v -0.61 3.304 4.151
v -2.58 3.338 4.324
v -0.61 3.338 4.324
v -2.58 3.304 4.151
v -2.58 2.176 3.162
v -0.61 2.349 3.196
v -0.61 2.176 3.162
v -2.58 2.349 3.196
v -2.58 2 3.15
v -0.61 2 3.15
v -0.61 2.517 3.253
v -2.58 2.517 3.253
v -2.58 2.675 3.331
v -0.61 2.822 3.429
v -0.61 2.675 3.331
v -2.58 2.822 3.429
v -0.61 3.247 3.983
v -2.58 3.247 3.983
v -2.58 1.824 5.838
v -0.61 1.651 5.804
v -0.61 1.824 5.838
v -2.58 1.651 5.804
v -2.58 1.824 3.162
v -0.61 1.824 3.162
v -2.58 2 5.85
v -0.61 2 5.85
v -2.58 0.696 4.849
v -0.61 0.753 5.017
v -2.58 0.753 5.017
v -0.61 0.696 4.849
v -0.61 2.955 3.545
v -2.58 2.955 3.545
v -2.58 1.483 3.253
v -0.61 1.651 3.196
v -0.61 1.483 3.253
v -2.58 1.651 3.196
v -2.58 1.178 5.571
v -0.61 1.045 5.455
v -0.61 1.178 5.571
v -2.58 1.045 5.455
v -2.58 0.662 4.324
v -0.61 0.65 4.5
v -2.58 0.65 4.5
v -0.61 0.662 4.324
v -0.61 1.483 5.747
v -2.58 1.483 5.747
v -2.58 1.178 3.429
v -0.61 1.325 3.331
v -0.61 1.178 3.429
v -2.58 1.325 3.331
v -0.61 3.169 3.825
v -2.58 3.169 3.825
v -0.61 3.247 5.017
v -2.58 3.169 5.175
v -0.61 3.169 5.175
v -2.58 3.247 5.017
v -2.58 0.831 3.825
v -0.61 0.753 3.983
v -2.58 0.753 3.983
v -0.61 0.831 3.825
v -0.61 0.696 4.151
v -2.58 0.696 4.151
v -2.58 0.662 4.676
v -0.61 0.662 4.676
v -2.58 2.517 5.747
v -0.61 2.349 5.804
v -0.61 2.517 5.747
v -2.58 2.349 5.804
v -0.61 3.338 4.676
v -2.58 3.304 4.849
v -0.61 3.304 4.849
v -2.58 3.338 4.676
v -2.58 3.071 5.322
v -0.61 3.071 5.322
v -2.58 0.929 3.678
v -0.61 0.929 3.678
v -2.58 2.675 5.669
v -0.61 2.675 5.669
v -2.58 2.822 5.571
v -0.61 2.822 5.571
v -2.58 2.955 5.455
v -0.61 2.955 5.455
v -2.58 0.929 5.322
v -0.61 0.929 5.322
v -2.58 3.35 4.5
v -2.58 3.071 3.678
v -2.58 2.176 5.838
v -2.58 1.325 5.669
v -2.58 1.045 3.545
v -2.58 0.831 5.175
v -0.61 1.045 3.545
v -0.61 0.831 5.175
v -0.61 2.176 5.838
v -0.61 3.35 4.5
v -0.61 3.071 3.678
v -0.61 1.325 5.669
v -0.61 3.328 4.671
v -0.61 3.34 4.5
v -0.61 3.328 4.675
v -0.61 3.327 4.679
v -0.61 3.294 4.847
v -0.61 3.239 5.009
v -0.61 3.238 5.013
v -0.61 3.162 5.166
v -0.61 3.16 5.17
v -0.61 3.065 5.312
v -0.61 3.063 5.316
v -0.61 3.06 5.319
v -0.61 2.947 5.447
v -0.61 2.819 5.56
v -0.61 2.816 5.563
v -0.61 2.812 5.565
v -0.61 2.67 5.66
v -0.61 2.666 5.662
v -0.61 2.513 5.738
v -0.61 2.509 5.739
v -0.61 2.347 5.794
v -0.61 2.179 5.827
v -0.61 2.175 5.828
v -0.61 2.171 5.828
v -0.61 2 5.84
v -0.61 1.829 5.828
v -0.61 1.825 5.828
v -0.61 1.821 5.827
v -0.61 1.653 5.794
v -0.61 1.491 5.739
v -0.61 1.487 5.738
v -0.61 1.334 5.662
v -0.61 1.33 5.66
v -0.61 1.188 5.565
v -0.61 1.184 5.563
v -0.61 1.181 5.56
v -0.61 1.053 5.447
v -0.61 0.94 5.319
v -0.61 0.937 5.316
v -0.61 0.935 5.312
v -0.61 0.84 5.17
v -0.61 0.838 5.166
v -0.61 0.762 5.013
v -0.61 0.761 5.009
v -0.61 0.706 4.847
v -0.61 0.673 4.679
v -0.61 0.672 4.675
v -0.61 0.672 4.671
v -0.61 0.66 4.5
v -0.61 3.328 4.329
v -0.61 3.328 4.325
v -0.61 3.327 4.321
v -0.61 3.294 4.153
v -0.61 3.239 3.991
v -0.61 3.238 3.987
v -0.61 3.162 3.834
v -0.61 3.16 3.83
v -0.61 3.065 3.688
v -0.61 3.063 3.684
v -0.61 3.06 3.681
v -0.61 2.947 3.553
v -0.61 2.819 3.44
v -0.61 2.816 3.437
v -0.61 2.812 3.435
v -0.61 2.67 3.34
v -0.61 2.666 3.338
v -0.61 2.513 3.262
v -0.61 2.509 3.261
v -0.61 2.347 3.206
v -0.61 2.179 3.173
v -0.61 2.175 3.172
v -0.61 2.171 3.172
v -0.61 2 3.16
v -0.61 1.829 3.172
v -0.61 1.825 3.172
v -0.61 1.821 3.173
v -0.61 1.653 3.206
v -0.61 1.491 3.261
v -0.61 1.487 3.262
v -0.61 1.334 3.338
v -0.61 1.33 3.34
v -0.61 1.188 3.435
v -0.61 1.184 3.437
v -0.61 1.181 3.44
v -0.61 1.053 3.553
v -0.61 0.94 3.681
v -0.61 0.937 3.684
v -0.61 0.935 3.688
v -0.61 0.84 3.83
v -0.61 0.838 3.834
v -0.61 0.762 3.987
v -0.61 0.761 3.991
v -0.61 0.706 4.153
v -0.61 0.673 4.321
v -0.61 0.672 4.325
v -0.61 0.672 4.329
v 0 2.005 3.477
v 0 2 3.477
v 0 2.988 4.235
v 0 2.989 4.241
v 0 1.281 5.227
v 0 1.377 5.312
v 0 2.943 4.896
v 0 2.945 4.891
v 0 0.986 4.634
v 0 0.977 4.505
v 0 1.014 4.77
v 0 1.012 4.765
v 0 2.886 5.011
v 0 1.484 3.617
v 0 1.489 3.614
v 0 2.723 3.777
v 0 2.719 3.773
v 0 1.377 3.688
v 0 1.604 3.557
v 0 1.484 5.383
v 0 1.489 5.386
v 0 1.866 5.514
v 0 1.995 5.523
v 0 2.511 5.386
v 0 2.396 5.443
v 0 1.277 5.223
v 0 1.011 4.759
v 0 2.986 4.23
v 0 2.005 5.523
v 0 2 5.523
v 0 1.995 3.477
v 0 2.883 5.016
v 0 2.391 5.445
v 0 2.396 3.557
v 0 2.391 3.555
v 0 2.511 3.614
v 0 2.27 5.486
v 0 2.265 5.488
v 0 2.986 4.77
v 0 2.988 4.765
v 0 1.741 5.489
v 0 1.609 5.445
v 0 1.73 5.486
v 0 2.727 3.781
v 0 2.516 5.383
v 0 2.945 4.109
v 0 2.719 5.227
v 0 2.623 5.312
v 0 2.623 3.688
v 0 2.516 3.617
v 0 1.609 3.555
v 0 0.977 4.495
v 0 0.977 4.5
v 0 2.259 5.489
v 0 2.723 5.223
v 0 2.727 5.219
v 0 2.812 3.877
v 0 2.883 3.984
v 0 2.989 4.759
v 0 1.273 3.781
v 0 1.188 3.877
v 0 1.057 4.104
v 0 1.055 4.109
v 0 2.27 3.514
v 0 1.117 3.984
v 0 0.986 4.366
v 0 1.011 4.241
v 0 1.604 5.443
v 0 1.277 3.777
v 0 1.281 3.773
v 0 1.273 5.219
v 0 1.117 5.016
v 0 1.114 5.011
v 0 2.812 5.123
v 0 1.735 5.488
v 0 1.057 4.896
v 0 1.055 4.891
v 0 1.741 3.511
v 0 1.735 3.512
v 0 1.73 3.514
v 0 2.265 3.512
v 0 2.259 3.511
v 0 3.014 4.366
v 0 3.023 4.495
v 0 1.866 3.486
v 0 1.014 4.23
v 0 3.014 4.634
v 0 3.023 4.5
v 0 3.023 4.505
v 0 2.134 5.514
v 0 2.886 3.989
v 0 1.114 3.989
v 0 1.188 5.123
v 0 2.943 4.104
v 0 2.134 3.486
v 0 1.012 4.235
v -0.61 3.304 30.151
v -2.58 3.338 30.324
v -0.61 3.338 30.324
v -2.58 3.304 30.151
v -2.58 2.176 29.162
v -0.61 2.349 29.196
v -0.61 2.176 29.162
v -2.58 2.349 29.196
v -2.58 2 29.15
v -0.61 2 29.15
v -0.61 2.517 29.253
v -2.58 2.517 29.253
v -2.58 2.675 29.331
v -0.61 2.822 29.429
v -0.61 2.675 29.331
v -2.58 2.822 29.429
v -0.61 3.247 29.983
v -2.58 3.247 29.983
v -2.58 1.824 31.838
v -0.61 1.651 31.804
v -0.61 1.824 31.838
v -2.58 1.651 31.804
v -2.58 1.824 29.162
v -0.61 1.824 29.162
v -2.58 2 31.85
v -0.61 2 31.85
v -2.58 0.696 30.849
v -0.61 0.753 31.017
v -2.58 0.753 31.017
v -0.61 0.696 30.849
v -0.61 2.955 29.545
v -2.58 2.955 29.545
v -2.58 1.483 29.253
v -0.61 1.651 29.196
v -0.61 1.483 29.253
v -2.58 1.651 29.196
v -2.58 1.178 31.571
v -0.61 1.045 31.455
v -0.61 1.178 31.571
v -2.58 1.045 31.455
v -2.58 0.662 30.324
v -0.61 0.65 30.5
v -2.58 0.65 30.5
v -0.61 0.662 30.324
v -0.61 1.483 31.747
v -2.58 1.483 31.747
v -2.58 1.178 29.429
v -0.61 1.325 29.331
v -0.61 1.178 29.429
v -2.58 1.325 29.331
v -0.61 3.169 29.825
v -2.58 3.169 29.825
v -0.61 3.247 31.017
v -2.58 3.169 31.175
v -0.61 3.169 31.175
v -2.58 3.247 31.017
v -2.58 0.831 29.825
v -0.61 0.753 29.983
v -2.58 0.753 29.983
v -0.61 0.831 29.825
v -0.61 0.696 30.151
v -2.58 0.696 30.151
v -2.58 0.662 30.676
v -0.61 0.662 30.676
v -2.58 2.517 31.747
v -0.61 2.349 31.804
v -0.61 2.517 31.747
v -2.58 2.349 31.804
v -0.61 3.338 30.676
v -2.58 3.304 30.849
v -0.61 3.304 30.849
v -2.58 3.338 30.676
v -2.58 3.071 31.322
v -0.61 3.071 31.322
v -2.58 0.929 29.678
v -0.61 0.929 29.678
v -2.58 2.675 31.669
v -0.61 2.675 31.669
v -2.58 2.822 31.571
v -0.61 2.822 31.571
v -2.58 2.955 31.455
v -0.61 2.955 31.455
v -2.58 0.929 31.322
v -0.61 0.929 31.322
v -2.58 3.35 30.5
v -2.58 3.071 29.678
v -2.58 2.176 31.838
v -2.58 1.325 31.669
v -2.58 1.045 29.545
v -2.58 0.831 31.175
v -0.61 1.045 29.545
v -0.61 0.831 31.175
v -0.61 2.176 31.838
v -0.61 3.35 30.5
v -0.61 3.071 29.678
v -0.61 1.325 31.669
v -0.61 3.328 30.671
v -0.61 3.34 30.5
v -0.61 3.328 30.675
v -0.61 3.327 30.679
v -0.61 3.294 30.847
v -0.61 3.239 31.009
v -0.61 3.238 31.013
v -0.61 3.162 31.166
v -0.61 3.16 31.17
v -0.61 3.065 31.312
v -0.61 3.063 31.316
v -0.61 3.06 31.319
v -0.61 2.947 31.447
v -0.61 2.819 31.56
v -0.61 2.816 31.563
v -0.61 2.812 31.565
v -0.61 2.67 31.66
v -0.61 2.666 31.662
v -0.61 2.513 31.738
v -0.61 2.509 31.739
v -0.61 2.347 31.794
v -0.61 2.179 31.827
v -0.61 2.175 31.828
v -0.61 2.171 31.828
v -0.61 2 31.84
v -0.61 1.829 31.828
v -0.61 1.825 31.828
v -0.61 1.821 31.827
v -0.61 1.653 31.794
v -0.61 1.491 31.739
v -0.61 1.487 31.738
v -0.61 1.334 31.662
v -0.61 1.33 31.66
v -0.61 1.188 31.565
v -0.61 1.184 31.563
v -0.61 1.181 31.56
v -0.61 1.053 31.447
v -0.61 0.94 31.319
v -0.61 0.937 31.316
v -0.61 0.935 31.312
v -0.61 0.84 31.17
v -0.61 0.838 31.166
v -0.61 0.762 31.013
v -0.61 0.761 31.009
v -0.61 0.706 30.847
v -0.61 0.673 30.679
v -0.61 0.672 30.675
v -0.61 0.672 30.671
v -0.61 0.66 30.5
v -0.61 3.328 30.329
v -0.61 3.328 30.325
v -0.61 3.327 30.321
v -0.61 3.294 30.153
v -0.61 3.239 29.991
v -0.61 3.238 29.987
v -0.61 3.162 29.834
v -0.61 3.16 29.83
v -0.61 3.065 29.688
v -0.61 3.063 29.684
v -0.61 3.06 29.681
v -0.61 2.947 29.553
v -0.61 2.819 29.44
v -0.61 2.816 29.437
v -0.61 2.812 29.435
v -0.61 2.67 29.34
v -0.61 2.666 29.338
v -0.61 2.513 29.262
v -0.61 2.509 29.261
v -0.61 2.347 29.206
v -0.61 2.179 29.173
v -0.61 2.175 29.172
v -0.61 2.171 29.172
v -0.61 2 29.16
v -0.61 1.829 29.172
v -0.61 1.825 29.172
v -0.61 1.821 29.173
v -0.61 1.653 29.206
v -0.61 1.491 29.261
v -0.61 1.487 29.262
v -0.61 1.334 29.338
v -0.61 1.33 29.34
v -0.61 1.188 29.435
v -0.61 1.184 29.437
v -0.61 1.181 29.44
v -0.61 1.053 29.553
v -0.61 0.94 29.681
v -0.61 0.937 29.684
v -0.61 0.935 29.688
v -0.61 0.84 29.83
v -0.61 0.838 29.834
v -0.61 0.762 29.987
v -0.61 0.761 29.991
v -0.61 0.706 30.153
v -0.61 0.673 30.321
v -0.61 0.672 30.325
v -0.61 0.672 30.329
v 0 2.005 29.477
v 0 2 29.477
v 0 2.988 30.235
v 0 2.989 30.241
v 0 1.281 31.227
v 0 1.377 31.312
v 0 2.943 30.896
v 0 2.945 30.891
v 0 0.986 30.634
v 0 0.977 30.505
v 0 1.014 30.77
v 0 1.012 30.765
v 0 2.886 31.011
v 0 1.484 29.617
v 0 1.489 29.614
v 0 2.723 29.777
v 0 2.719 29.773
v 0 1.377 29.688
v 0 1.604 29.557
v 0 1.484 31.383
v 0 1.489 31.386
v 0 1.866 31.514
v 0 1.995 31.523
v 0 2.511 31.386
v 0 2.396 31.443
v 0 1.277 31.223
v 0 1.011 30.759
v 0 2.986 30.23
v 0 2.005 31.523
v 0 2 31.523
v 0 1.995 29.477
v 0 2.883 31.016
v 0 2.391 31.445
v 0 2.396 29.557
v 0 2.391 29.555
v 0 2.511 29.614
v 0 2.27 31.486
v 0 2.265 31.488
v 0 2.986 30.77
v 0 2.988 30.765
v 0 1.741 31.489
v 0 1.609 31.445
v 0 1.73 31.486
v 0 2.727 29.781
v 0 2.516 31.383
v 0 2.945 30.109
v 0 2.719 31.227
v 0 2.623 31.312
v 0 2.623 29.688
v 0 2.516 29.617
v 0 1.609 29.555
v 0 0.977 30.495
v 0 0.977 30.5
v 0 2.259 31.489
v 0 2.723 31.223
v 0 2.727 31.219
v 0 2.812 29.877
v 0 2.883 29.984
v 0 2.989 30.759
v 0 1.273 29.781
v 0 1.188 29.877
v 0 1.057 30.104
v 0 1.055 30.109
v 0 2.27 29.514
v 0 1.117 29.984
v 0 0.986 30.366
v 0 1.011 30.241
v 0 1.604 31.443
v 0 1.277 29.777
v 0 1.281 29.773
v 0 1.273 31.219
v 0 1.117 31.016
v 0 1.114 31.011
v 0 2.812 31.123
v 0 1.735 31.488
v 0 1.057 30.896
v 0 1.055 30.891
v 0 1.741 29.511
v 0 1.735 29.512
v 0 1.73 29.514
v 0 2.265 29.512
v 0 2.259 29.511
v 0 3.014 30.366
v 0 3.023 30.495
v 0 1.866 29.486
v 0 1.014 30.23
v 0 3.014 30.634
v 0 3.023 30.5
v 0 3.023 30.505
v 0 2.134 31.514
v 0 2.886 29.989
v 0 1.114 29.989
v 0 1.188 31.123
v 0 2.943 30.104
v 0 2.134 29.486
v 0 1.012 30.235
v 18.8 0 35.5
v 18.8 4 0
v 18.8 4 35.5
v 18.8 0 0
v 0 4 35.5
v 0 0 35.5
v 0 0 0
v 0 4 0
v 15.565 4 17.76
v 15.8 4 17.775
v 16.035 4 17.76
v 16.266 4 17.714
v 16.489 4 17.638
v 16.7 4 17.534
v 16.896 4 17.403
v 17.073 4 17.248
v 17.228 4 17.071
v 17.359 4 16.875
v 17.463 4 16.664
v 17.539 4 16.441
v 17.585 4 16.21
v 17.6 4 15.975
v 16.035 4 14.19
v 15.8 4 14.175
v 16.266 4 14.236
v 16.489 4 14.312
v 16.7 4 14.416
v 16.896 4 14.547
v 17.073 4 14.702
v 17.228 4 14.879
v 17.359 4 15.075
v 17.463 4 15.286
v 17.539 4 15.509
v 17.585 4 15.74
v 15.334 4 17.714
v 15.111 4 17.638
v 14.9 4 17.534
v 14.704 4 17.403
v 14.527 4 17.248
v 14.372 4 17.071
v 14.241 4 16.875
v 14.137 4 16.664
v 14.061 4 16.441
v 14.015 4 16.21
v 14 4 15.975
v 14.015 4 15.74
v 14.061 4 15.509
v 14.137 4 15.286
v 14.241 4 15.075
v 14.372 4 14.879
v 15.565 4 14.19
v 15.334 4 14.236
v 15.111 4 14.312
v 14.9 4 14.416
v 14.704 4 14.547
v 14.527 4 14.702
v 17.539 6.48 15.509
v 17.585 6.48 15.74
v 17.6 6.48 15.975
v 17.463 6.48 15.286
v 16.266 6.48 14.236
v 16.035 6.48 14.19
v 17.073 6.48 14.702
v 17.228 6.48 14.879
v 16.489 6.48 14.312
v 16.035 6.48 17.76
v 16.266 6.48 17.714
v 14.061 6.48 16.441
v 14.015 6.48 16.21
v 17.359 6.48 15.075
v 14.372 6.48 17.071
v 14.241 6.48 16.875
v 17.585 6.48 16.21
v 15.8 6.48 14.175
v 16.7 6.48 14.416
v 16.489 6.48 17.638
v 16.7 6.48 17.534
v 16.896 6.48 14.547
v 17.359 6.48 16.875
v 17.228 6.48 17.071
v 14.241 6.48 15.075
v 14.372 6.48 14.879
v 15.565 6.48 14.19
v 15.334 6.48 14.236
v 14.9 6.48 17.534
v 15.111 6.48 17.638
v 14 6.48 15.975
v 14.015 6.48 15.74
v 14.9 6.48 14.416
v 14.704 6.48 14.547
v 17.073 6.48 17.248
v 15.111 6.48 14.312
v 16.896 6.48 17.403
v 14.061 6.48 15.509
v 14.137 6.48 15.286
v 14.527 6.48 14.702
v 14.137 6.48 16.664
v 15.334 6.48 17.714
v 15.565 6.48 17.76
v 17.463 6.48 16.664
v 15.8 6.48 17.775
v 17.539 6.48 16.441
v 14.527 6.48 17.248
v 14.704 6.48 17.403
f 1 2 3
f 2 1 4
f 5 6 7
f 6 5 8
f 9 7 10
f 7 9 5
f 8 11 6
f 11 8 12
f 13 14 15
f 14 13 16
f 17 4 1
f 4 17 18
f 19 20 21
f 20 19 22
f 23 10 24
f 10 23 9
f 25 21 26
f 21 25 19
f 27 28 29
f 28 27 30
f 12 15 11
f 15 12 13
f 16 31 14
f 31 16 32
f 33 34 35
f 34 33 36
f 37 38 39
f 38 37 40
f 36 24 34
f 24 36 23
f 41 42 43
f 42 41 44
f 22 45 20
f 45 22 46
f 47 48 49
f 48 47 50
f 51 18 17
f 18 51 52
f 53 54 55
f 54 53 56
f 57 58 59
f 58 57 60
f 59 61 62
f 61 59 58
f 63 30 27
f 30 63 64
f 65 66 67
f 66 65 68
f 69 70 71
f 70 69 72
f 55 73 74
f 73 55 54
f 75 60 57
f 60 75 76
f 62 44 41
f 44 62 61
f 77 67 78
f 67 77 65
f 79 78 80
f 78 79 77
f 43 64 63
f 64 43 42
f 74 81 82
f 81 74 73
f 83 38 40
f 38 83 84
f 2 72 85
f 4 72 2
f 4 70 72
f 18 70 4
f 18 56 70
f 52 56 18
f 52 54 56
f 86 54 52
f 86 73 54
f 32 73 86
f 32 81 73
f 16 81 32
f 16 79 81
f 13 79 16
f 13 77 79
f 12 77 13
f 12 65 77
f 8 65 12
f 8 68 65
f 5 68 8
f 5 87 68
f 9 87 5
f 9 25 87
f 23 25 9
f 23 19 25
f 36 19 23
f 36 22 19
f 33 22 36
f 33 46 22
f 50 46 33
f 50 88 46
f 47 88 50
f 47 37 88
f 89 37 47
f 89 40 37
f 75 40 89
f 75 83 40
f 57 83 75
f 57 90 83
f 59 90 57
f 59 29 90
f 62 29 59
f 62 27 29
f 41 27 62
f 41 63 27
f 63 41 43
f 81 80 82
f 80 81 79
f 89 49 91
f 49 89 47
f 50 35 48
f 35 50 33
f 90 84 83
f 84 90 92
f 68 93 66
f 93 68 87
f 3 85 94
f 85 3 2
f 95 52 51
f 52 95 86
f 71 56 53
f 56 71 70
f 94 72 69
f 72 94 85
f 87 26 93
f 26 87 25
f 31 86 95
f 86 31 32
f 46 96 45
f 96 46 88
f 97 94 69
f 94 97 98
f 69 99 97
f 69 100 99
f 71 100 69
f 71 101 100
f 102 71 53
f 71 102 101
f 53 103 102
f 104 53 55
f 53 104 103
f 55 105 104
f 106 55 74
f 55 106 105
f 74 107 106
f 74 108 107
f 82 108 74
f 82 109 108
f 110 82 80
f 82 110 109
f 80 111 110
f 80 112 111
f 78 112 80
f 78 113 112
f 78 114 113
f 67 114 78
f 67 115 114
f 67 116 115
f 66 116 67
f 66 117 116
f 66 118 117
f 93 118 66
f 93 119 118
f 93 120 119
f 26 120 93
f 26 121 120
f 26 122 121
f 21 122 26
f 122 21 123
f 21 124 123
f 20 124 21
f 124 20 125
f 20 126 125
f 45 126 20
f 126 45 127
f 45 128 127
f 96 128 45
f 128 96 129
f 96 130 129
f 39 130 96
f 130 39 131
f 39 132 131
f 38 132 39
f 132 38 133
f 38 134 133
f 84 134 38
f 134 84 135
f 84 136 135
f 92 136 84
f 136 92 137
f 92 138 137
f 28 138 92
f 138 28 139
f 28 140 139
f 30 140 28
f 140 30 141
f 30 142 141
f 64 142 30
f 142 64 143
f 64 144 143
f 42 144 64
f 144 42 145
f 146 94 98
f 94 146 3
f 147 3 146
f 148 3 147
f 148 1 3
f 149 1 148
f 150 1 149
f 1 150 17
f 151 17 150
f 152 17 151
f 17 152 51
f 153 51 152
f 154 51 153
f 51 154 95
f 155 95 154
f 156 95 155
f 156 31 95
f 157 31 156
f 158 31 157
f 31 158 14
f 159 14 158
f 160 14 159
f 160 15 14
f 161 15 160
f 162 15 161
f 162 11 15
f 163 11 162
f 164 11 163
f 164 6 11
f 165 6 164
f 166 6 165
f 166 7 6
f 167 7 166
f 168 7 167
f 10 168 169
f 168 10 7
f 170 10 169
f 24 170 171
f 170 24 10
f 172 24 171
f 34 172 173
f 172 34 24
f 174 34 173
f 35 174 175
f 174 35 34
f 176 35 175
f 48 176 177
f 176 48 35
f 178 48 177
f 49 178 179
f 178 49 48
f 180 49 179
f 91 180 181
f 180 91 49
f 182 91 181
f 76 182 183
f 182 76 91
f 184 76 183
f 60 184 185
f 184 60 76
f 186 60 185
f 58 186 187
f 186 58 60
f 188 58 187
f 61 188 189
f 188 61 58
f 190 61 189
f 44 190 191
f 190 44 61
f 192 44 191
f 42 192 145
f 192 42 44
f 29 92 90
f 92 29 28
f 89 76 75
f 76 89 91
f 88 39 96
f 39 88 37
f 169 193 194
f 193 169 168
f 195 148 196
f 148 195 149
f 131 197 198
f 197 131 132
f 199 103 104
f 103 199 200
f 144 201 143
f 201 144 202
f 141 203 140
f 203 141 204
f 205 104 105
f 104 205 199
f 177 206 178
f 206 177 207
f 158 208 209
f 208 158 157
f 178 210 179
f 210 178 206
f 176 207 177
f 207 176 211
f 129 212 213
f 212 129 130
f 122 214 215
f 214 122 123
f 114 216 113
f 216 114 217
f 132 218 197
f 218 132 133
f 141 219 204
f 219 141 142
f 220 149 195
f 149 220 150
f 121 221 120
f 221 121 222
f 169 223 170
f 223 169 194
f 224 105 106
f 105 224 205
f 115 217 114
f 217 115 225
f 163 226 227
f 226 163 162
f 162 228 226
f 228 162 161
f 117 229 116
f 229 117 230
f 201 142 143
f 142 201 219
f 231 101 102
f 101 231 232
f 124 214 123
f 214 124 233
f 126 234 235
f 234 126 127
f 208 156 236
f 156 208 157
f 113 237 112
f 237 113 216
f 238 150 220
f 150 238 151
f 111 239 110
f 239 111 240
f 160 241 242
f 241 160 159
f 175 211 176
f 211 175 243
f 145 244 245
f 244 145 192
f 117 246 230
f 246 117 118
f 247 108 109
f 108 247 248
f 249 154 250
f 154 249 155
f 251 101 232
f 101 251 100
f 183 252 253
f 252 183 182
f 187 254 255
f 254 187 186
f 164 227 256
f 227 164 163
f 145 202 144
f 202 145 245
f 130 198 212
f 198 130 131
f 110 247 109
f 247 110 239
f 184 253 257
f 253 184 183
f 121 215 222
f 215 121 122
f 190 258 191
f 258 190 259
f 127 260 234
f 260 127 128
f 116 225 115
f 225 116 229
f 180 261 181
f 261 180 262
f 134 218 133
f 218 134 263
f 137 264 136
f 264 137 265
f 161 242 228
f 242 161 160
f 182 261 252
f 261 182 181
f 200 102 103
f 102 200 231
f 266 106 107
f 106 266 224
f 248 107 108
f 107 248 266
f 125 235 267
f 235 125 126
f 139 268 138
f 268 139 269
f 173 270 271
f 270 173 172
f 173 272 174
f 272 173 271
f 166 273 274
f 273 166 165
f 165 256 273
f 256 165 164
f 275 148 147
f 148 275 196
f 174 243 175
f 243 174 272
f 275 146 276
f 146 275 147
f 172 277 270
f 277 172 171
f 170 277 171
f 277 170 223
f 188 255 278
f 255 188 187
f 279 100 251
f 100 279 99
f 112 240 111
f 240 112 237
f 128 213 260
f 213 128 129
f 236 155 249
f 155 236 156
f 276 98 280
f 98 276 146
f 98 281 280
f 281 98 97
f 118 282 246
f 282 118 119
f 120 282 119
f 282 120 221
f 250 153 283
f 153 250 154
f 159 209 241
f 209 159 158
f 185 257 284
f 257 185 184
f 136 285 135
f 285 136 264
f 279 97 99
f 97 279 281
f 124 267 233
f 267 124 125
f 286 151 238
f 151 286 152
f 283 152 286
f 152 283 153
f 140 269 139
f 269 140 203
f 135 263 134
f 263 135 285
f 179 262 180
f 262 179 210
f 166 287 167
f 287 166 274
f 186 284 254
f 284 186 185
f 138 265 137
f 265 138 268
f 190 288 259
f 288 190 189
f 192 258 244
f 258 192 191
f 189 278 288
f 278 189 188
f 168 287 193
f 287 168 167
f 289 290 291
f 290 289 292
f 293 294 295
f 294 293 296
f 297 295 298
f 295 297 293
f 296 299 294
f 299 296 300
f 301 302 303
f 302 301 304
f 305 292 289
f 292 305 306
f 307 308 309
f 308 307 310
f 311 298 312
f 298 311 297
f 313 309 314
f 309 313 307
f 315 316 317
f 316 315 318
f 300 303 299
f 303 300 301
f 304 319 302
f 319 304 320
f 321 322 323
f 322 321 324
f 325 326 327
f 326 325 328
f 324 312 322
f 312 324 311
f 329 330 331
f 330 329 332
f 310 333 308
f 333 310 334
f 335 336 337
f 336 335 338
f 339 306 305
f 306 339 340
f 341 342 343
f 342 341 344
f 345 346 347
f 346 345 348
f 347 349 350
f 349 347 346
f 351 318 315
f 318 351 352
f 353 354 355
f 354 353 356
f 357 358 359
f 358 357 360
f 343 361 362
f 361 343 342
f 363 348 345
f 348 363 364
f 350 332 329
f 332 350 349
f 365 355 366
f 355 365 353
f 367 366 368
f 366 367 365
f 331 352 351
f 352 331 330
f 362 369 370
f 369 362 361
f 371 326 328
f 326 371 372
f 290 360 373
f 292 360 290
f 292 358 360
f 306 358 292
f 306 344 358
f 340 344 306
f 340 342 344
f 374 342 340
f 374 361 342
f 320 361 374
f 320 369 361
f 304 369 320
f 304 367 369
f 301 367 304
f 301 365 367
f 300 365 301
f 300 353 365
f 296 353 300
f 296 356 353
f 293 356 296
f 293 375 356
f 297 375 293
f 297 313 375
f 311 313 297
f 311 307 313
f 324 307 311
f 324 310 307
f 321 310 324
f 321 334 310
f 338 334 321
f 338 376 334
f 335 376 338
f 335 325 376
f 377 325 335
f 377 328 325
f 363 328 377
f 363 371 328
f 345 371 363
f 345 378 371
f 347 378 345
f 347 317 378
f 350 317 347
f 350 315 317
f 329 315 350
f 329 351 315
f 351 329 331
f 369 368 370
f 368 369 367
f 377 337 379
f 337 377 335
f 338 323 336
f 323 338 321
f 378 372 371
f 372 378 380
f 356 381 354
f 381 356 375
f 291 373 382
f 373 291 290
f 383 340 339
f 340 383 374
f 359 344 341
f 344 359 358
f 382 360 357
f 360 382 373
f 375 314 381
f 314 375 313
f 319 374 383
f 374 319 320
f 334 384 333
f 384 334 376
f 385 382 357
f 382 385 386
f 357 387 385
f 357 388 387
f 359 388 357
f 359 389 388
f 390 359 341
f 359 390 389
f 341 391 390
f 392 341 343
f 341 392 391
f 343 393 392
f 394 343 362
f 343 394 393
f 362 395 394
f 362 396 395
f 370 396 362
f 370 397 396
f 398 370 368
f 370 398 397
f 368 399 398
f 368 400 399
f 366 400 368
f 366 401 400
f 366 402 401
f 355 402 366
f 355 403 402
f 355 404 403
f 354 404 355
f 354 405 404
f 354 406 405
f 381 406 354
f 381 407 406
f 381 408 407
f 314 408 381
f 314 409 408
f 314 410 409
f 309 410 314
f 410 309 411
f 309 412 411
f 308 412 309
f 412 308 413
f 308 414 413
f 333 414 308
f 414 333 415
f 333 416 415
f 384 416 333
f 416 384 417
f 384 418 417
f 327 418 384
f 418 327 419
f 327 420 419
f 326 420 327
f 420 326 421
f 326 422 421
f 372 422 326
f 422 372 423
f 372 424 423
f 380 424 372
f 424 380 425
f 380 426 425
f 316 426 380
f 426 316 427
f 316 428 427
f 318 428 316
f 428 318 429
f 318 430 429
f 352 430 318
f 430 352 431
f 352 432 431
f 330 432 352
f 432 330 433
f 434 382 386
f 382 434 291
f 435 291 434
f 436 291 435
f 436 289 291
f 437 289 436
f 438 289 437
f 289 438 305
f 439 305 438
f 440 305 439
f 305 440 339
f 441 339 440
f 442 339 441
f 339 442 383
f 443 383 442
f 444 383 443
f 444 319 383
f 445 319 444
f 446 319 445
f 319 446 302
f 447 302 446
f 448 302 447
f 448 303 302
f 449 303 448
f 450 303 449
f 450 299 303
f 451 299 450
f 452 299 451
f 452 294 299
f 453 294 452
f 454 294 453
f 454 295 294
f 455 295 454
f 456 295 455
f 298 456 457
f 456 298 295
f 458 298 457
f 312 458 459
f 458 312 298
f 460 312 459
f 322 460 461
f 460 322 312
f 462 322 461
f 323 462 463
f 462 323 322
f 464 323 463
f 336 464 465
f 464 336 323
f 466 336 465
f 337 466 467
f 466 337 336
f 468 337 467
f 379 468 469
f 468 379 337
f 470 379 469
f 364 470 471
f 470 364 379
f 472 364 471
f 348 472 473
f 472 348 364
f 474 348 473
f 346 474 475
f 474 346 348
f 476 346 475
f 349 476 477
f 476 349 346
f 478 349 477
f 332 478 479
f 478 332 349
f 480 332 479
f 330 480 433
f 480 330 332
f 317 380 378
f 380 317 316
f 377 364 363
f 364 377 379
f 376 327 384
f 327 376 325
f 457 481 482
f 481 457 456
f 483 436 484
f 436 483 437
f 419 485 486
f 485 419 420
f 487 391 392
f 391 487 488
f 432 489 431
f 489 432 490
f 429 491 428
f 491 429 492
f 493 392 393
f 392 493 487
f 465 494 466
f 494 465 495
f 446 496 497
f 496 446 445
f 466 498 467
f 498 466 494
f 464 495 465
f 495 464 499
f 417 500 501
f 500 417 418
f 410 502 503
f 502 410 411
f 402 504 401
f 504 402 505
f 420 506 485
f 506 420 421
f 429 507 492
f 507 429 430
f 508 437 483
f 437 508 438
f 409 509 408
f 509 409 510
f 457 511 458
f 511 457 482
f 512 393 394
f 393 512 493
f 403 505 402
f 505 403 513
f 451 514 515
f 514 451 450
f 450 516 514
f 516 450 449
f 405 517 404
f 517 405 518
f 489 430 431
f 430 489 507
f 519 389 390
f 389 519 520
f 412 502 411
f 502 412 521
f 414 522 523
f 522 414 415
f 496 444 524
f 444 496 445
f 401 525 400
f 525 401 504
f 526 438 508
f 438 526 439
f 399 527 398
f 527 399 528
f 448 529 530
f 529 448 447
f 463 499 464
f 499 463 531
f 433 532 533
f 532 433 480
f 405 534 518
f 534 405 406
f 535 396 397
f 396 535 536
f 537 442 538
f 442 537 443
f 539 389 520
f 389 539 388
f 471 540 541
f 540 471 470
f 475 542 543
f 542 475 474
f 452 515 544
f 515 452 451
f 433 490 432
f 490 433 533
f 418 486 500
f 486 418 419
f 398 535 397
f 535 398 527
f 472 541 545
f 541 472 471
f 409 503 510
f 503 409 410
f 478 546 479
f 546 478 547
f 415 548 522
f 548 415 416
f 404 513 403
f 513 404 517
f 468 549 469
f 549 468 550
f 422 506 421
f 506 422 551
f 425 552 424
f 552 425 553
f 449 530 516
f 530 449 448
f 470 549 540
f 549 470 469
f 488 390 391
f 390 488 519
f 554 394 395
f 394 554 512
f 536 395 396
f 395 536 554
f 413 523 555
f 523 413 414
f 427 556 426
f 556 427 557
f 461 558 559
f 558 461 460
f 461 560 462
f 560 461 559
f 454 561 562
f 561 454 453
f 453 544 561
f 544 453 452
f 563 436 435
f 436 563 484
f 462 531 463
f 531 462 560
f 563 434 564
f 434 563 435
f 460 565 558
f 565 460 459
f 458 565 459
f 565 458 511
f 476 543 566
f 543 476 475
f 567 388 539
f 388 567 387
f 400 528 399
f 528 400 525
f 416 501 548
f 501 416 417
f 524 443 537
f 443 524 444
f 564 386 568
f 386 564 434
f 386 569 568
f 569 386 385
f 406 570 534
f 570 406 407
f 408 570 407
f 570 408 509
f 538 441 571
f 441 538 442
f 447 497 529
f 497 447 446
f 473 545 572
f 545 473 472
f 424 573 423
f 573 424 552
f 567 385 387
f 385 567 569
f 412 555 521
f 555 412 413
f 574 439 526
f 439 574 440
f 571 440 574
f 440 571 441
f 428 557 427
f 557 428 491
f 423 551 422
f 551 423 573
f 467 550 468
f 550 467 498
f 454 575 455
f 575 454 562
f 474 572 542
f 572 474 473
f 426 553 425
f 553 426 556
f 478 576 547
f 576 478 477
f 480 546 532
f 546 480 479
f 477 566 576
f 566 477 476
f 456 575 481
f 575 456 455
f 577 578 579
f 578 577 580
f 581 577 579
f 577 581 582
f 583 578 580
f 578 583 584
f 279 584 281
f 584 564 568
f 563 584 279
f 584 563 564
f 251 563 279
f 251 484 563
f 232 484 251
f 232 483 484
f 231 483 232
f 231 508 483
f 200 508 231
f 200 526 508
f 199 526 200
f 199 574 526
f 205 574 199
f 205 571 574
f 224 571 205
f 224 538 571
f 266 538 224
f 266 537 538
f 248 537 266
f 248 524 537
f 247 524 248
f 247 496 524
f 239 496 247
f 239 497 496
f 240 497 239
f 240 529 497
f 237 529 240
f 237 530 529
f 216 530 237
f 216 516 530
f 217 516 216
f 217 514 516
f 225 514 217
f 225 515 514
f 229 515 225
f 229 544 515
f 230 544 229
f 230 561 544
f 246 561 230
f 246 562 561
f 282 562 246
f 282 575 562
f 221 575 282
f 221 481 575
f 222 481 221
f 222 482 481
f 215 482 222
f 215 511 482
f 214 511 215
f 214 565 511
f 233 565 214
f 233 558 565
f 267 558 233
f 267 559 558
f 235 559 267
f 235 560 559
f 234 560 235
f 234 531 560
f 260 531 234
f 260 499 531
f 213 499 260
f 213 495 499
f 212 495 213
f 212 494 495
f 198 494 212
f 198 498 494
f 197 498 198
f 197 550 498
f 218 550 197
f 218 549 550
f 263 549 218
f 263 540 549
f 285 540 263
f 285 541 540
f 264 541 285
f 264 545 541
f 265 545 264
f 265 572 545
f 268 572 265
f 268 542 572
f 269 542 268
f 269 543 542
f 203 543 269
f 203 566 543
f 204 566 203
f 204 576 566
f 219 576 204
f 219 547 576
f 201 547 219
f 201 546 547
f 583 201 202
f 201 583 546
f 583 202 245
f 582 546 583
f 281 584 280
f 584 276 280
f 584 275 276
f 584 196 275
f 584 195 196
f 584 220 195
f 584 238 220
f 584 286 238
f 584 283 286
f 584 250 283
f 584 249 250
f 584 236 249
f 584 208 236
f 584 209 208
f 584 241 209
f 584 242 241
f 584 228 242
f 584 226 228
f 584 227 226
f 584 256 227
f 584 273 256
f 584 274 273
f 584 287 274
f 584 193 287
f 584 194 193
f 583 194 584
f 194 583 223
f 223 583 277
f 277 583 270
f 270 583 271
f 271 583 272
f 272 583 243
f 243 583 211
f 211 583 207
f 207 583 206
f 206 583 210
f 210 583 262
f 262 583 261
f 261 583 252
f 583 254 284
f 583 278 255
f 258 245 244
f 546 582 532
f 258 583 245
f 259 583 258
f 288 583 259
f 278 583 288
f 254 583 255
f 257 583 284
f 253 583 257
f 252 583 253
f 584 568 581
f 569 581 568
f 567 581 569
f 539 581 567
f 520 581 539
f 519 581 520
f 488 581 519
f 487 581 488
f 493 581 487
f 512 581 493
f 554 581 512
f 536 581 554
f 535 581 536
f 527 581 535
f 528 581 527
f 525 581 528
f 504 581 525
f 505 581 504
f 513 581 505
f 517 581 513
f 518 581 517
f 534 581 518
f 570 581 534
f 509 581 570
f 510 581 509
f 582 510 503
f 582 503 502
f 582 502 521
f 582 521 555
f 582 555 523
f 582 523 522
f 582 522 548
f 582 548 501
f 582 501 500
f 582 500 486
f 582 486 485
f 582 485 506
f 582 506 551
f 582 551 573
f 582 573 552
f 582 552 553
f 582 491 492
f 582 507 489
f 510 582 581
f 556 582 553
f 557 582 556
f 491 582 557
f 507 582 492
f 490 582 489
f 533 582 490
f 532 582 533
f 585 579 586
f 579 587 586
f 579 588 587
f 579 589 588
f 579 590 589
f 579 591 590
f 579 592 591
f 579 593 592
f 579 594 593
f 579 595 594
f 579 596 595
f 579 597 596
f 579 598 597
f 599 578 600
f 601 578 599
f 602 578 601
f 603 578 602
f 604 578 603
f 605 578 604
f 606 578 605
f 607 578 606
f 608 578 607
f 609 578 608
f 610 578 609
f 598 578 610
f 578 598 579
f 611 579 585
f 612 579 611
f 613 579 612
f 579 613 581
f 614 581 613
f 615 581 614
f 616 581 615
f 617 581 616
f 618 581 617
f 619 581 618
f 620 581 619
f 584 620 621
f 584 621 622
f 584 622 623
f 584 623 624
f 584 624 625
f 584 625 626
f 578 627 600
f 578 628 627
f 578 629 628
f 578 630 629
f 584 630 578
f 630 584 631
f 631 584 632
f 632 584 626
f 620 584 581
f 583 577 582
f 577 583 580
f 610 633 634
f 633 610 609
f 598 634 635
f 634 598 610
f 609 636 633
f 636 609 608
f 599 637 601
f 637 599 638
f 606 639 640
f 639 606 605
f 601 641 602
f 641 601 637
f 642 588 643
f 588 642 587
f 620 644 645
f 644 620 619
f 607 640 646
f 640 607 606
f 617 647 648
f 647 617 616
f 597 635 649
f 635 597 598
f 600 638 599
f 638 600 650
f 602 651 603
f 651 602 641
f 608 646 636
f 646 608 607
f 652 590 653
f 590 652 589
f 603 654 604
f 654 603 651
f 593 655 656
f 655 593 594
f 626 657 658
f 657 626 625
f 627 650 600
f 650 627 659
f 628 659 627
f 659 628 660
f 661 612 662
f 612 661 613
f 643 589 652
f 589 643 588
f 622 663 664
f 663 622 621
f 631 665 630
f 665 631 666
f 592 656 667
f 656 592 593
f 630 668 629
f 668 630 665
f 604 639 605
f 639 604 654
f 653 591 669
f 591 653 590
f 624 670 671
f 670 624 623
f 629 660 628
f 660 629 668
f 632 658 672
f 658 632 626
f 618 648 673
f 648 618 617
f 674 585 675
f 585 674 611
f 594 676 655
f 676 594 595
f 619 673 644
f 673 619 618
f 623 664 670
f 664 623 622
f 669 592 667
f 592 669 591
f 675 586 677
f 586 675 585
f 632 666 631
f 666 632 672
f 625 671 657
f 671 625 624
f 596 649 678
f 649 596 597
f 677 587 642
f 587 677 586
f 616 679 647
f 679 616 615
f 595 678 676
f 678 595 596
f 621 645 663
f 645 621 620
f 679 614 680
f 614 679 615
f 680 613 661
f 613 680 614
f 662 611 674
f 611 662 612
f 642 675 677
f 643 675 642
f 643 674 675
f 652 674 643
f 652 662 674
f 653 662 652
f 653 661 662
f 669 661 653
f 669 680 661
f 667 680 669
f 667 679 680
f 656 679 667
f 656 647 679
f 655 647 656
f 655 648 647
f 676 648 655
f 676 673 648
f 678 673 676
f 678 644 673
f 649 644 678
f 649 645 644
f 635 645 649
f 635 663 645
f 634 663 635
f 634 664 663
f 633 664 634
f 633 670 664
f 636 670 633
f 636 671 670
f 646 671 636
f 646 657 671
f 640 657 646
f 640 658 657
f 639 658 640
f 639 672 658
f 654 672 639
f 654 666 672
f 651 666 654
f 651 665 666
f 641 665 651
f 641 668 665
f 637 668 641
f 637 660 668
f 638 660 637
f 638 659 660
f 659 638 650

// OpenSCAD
// =========================================================
// FOLHA DA PORTA (GIRO LIVRE - PAREDE COM PORTA 50x50)
// Auditado para OpenSCAD 2021.01
// =========================================================

// --- Referencia do vao da porta (deve bater com a parede) ---
largura_vao_porta = 22;      // Largura do recorte na parede
altura_vao_porta  = 38;      // Altura do recorte na parede

// --- Dimensoes da folha da porta ---
folga_largura     = 3.2;     // Folga extra para giro livre sem raspar
folga_chao        = 1.5;     // Folga abaixo da porta para nao arrastar
folga_topo        = 1.0;     // Folga acima da porta
espessura_porta   = 4.0;     // Espessura da folha da porta

// --- Pinos de dobradica (alinhados com os furos da parede) ---
tem_pinos_pivo    = true;
raio_pivo         = 1.35;    // Cabe em furo de 1.6 mm com folga de ~0.25 mm
comp_pivo         = 2.6;     // Entra no furo de 3.0 mm sem bater no fundo
altura_pivo_inf   = 6.0;     // Mesma altura do furo inferior na parede
altura_pivo_sup   = 32.0;    // Mesma altura do furo superior na parede

// --- Puxador / macaneta compacto ---
tem_puxador       = true;
raio_puxador      = 1.8;     // Raio compacto para nao enroscar
comp_puxador      = 2.5;     // Comprimento curto para girar livre
puxador_ambos_lados = false; // false = apenas um lado; true = ambos os lados

// Resolucao de cilindros
$fn = 48;

module pino_pivo(r, h) {
    union() {
        cylinder(h = h * 0.75 + 0.02, r = r);
        translate([0, 0, h * 0.75])
            cylinder(h = h * 0.25, r1 = r, r2 = r * 0.75);
    }
}

module folha_da_porta() {
    largura_folha = largura_vao_porta - folga_largura;
    altura_folha  = altura_vao_porta - folga_chao - folga_topo;

    z_pivo_inf_rel = altura_pivo_inf - folga_chao;
    z_pivo_sup_rel = altura_pivo_sup - folga_chao;

    union() {
        // Corpo da folha da porta
        cube([largura_folha, espessura_porta, altura_folha]);

        // Pinos de pivo na borda esquerda (-X)
        if (tem_pinos_pivo) {
            for (z_rel = [z_pivo_inf_rel, z_pivo_sup_rel]) {
                if (z_rel > 0 && z_rel < altura_folha) {
                    translate([-comp_pivo + 0.02, espessura_porta / 2, z_rel])
                    rotate([0, 90, 0])
                        pino_pivo(raio_pivo, comp_pivo);
                }
            }
        }

        // Puxador compacto na borda direita da folha
        if (tem_puxador) {
            z_macaneta = altura_folha * 0.45;
            x_macaneta = largura_folha - 3.0;

            // Lado frontal (+Y)
            translate([x_macaneta, espessura_porta - 0.02, z_macaneta])
            rotate([-90, 0, 0])
                cylinder(h = comp_puxador, r = raio_puxador);

            // Lado traseiro (-Y), opcional
            if (puxador_ambos_lados) {
                translate([x_macaneta, 0.02, z_macaneta])
                rotate([90, 0, 0])
                    cylinder(h = comp_puxador, r = raio_puxador);
            }
        }
    }
}

folha_da_porta();
